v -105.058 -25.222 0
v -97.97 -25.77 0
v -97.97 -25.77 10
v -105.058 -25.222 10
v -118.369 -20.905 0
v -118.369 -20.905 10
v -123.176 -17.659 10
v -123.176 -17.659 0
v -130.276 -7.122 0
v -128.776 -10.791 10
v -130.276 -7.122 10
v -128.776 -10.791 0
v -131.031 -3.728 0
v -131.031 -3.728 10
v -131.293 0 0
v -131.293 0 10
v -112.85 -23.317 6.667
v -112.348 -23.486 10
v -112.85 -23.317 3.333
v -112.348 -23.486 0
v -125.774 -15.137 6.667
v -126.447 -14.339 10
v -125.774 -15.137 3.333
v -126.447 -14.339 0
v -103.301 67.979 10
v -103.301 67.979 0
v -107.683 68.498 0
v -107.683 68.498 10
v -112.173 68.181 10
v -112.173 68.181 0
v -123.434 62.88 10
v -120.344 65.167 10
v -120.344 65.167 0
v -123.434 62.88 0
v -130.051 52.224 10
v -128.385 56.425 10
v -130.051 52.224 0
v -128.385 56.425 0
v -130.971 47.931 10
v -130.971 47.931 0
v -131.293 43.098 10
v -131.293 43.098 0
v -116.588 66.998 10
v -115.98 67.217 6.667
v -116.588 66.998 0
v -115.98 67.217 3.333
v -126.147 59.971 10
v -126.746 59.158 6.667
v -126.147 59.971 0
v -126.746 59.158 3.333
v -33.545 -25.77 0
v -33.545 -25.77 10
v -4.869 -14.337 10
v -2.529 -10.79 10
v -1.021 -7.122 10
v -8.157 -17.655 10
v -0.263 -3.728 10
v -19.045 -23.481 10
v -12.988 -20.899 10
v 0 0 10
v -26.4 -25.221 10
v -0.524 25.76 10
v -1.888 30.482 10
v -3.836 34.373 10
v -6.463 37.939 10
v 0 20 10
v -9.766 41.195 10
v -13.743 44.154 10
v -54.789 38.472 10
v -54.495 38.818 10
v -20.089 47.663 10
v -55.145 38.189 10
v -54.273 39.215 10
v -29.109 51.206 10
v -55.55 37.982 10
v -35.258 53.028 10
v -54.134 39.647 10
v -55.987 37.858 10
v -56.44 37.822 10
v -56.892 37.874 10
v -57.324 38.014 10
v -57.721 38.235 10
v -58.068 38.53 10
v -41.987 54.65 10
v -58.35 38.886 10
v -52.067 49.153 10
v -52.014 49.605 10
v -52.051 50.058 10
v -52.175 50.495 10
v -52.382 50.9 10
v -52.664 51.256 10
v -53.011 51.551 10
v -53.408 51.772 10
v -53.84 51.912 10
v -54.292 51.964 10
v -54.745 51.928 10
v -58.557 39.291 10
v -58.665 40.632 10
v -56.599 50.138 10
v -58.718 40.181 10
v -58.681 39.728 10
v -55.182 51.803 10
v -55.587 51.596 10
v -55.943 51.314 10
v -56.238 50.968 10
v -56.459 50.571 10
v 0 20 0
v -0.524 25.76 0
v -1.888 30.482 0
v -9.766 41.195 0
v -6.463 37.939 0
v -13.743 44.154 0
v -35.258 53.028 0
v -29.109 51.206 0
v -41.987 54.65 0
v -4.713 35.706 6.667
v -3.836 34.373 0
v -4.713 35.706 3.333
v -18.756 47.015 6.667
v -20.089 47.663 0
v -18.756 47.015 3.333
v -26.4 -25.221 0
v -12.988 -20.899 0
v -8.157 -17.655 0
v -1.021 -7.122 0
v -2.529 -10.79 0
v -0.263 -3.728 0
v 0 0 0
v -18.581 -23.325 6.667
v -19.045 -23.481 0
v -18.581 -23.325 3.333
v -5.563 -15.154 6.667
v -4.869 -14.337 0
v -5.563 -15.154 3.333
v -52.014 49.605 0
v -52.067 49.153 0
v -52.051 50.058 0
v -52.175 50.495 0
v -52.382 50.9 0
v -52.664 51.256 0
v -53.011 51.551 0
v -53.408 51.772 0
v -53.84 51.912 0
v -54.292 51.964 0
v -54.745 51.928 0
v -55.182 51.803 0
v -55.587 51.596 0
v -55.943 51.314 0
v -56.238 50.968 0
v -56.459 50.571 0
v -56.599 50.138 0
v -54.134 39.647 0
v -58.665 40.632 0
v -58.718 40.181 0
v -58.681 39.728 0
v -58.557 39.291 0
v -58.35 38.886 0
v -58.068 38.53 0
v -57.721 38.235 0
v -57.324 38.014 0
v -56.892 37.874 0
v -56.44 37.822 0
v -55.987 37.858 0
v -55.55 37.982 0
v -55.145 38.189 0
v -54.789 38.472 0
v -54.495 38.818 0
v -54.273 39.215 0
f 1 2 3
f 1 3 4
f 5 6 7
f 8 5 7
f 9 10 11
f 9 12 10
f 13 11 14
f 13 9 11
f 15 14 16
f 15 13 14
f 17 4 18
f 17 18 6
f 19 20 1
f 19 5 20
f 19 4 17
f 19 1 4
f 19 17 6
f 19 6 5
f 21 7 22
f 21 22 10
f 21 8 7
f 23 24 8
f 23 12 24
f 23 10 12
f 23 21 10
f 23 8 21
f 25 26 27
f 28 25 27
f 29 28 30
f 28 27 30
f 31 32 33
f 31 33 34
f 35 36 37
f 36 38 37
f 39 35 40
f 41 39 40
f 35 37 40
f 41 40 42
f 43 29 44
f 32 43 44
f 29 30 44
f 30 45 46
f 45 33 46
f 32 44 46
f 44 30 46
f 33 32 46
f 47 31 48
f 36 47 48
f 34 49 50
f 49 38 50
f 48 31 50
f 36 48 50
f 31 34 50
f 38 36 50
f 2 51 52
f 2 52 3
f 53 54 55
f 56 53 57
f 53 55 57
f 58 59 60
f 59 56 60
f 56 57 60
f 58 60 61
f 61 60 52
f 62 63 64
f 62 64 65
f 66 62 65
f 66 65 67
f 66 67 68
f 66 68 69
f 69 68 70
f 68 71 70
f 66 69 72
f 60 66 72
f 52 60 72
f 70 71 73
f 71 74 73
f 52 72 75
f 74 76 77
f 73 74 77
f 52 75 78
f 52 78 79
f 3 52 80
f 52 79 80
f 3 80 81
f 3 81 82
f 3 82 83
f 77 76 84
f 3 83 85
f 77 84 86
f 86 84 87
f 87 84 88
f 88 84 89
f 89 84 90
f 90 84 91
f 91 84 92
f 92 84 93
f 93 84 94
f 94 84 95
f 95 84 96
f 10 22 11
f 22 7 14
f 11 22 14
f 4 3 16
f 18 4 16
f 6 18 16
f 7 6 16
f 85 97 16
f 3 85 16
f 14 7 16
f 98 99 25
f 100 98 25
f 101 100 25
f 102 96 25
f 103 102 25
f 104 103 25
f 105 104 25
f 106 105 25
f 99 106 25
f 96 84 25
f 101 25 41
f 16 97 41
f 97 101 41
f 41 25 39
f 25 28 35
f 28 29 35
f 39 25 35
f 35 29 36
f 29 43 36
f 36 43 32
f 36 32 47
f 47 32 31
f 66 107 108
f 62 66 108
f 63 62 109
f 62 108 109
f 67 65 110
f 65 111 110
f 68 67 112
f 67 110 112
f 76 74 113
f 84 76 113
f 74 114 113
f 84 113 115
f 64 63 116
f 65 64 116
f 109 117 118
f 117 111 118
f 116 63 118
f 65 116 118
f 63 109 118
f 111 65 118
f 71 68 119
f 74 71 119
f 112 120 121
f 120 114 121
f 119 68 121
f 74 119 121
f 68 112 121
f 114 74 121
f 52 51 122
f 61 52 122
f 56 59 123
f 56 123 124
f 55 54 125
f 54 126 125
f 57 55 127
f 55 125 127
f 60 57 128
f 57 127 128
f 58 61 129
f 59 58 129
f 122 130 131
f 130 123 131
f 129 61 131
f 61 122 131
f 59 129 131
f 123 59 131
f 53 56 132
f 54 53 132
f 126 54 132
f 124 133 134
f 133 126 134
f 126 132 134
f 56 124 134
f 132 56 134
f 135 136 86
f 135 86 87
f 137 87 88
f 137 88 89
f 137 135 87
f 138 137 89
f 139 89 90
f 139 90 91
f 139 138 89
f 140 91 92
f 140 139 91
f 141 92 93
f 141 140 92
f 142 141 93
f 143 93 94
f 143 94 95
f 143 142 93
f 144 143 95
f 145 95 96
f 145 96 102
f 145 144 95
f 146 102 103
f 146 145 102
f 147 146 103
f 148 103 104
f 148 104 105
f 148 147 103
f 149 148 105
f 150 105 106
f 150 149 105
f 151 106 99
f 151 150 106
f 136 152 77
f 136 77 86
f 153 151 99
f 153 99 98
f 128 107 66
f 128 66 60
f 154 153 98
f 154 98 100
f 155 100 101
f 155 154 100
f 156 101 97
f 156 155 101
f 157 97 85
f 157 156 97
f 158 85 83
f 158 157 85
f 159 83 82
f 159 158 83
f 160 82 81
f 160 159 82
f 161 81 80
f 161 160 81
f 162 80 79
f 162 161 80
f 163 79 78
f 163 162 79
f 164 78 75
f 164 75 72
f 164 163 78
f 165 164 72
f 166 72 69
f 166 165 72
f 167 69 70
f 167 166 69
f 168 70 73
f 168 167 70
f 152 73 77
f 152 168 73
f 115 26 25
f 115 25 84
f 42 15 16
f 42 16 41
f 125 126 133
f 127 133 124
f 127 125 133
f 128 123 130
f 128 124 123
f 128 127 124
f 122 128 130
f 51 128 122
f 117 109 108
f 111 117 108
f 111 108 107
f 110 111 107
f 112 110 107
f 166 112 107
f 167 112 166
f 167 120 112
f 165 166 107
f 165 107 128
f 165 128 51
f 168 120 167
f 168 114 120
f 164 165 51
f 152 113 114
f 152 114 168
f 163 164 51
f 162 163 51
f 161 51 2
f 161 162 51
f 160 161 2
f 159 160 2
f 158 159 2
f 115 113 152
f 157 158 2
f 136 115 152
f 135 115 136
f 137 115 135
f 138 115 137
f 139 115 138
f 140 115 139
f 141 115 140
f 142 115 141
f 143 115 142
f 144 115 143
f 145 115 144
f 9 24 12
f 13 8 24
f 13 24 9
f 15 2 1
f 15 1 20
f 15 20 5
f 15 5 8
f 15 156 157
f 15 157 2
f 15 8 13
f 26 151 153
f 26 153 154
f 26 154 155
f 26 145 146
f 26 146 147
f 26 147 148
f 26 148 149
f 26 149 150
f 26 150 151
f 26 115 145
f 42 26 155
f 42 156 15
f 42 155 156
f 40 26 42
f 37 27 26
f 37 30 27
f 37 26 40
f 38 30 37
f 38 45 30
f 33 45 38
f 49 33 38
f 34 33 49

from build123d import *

# Parameters (mm, degrees)
EXTRUDE_1_DEPTH = 10


with BuildPart() as part:
    # Эскиз1_fr → Бобышка-Вытянуть1 (new body)
    with BuildSketch(Plane.XY):
        with BuildLine():
            add(Edge.make_bspline(
                [(-97.969549234, -25.769768053), (-112.011160689, -25.769768053), (-131.292525164, -19.025155818), (-131.292525164, 0)],
                knots=[0, 0, 0, 0, 1, 1, 1, 1], degree=3))
            Line((-131.292525164, 0), (-131.292525164, 43.097715536))
            add(Edge.make_bspline(
                [(-103.301225383, 67.978870897), (-115.500001367, 70.63077872), (-131.292525164, 63.393306184), (-131.292525164, 43.097715536)],
                knots=[0, 0, 0, 0, 1, 1, 1, 1], degree=3))
            Line((-103.301225383, 67.978870897), (-41.986949672, 54.649680525))
            add(Edge.make_bspline(
                [(0, 20), (0, 38.146025899), (-14.209474182, 48.611098897), (-41.986949672, 54.649680525)],
                knots=[0, 0, 0, 0, 1, 1, 1, 1], degree=3))
            Line((0, 20), (0, 0))
            add(Edge.make_bspline(
                [(-33.545129103, -25.769768053), (-19.444866568, -25.769768053), (0, -19.063757455), (0, 0)],
                knots=[0, 0, 0, 0, 1, 1, 1, 1], degree=3))
            Line((-33.545129103, -25.769768053), (-97.969549234, -25.769768053))
        make_face()
        with BuildLine():
            ThreePointArc((-58.66509027, 40.632464429), (-56.891886772, 37.874147876), (-54.133570218, 39.647351375))
            Line((-54.133570218, 39.647351375), (-52.067053016, 49.153330507))
            ThreePointArc((-52.067053016, 49.153330507), (-53.840256514, 51.91164706), (-56.598573068, 50.138443562))
            Line((-56.598573068, 50.138443562), (-58.66509027, 40.632464429))
        make_face(mode=Mode.SUBTRACT)
    extrude(amount=EXTRUDE_1_DEPTH)


solid = part.part
